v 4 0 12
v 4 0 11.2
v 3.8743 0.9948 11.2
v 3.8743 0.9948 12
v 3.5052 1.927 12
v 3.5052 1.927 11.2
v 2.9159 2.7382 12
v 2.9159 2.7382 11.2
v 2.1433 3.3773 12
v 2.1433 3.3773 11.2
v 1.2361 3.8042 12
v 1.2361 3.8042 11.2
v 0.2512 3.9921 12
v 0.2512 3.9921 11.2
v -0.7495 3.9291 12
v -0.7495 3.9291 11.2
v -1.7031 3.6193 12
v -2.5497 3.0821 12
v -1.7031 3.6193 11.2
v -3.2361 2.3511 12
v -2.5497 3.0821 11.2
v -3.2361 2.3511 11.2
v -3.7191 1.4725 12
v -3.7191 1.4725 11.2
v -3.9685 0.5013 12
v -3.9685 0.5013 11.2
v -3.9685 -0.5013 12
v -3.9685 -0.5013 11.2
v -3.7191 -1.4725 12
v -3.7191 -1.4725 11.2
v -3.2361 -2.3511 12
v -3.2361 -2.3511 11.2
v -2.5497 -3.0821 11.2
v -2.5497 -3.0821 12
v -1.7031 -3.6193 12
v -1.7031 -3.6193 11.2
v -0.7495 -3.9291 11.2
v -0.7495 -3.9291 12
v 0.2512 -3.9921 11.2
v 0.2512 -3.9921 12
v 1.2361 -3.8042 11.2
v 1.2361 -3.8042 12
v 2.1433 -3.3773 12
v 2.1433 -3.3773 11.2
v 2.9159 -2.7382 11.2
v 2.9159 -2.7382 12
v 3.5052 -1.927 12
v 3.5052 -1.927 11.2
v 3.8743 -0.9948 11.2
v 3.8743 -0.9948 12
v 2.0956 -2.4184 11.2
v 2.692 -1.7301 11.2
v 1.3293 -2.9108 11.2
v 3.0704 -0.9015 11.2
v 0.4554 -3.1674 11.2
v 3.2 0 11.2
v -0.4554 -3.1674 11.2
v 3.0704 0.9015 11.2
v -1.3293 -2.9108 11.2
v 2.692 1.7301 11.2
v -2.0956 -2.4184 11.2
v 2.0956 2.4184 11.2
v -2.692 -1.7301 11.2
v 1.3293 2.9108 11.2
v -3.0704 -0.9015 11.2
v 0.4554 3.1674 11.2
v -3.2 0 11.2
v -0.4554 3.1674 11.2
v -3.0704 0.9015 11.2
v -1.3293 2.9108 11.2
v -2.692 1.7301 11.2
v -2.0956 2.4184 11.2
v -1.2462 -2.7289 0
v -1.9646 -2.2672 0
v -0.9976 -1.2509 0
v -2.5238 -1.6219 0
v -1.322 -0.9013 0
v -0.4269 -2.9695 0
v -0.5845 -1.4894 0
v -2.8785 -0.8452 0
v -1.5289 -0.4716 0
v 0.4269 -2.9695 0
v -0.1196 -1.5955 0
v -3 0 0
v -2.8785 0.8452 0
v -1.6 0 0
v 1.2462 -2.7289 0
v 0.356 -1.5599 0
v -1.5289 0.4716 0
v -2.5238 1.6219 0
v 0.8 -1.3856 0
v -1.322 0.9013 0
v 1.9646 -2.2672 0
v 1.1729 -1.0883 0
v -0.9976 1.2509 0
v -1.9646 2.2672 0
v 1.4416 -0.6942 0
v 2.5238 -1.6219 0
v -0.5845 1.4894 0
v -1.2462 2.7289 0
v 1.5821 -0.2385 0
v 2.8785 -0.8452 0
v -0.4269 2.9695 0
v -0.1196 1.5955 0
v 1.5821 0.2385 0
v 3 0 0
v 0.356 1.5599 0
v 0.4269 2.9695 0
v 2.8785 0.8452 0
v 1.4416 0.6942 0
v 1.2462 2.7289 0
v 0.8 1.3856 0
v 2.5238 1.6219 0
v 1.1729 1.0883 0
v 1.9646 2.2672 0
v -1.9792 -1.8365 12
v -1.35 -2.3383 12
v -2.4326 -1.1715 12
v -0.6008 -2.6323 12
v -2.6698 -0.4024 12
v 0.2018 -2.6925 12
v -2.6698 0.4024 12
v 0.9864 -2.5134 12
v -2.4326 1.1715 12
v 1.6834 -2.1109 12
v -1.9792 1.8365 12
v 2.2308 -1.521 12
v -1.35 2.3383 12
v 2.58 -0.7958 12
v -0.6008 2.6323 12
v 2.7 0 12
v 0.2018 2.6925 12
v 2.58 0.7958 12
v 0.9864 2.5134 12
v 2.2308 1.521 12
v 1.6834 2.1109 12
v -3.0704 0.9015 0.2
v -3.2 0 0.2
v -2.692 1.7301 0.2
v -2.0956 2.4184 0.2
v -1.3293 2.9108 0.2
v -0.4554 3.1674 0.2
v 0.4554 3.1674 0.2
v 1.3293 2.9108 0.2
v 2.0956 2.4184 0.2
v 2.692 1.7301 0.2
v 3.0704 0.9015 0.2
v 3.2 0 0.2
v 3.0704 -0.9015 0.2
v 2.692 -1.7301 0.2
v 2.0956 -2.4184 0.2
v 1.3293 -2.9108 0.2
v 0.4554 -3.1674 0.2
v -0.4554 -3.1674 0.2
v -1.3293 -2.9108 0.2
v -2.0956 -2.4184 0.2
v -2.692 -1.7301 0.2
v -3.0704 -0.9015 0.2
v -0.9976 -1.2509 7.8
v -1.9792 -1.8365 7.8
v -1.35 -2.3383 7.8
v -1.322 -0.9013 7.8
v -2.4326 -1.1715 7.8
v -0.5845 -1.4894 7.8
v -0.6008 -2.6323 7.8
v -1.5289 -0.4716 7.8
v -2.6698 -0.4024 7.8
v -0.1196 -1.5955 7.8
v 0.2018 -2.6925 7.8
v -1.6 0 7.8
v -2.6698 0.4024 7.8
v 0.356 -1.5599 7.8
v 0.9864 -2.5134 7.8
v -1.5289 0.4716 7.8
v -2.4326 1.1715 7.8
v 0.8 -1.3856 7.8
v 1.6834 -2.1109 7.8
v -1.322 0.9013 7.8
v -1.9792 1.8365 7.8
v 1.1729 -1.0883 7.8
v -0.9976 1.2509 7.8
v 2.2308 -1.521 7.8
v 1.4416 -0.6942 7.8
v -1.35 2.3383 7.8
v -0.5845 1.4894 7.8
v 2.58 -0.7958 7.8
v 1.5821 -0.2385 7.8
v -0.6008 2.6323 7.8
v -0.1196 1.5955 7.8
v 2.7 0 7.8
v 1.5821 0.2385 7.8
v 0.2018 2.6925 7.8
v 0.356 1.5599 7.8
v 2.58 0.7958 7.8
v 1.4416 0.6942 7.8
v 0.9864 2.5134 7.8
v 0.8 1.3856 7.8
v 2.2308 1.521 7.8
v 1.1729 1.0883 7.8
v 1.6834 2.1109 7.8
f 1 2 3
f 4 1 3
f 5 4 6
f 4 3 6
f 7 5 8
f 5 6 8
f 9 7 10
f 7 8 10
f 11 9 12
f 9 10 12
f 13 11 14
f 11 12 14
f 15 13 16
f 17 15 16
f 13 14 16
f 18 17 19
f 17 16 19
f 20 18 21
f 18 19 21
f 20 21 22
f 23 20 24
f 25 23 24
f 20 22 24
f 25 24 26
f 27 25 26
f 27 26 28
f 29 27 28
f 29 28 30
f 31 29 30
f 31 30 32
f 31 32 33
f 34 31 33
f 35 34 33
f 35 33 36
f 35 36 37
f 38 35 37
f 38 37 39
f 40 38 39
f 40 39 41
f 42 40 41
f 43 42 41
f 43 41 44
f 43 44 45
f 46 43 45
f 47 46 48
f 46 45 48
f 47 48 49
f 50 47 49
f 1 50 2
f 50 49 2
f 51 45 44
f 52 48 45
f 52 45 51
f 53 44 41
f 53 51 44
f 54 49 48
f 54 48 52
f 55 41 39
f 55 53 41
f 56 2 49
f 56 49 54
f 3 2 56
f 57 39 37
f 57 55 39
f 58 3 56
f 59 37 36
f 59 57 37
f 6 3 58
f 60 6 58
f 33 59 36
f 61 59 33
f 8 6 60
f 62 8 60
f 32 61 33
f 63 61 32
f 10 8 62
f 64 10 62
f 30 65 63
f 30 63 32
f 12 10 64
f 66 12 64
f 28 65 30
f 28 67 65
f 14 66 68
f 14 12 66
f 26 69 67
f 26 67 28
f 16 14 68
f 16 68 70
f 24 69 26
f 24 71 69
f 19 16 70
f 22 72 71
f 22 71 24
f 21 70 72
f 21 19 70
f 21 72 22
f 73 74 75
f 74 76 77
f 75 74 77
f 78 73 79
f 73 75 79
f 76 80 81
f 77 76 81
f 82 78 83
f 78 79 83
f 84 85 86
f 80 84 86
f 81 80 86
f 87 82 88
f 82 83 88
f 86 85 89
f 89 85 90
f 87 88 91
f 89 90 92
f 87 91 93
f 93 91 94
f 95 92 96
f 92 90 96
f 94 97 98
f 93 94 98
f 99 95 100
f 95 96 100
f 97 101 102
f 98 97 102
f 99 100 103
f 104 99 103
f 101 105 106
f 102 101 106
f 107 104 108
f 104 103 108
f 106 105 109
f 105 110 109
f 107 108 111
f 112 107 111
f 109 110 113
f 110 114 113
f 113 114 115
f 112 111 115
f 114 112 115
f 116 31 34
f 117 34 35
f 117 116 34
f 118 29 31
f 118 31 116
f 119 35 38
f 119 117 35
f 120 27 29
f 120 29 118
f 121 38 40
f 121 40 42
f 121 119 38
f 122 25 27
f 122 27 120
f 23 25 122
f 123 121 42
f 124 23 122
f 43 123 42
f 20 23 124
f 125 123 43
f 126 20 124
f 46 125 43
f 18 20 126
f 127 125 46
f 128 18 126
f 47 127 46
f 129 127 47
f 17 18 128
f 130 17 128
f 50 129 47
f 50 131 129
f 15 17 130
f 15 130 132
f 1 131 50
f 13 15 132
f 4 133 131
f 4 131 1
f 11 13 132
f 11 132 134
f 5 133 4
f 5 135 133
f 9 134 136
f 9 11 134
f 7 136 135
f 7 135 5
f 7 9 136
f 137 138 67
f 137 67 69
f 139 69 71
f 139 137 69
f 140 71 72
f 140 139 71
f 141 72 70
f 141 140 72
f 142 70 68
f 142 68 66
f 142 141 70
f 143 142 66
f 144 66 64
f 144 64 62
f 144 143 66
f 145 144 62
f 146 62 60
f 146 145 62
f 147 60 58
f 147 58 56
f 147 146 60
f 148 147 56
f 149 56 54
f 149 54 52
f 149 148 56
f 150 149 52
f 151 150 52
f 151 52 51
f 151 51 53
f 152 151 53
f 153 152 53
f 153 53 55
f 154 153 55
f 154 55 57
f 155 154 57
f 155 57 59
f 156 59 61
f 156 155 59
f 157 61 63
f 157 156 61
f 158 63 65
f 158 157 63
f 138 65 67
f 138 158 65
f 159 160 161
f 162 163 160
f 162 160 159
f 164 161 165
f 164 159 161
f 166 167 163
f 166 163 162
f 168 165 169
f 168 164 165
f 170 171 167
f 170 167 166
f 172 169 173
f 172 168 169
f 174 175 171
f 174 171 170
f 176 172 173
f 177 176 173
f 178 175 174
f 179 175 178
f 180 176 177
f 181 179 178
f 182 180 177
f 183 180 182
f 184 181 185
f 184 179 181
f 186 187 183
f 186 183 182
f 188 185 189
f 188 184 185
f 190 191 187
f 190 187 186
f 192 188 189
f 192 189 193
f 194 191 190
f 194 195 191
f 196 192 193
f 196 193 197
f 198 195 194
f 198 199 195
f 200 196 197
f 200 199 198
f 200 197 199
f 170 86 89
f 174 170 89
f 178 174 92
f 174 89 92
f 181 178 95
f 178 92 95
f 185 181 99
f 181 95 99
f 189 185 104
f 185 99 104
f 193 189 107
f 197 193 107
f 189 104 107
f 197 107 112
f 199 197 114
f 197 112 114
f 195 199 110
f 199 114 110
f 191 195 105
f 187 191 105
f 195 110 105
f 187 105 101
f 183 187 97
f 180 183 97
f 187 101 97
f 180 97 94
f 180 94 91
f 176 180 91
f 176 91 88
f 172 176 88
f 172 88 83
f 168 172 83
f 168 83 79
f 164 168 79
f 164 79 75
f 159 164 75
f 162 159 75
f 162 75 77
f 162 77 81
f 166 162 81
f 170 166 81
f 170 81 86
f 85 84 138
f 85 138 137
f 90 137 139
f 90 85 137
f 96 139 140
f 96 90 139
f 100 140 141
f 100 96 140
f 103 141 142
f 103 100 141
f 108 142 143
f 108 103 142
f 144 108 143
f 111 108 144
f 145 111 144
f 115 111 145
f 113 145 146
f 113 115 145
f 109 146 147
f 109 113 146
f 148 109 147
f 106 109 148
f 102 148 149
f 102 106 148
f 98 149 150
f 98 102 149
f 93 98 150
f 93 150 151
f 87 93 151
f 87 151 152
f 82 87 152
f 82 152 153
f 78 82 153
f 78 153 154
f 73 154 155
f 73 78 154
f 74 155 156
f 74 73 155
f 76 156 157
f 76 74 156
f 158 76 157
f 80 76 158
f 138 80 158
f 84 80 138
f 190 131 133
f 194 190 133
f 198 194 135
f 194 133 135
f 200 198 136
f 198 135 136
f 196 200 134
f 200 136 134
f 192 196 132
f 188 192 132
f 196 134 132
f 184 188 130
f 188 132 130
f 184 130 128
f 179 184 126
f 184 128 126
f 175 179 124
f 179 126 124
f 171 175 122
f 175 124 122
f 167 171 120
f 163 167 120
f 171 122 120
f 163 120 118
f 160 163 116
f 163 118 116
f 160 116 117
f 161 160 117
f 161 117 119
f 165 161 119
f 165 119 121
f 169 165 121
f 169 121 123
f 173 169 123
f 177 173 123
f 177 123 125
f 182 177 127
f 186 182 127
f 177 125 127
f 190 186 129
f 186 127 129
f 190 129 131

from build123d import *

# Parameters (mm, degrees)
SKETCH_1_R          = 4
EXTRUDE_1_DEPTH     = 12
SKETCH_2_R          = 2.7
CUT_EXTRUDE_1_DEPTH = 4.2
SKETCH_3_OUTSIDE_W  = 13.298
SKETCH_3_OUTSIDE_H  = 13.298
SKETCH_3_OUTSIDE_R  = 3.2
CUT_EXTRUDE_2_DEPTH = 11.2
SKETCH_4_R          = 1.6
CUT_EXTRUDE_3_DEPTH = 11.2
CHAMFER_1_SIZE      = 0.2


with BuildPart() as part:
    # Эскиз1 → Бобышка-Вытянуть1 (new body)
    with BuildSketch(Plane.XY):
        Circle(SKETCH_1_R)
    extrude(amount=EXTRUDE_1_DEPTH)

    # Эскиз2 → Вырез-Вытянуть1 (cut)
    with BuildSketch(Plane.XY.offset(12)):
        Circle(SKETCH_2_R)
    extrude(amount=-CUT_EXTRUDE_1_DEPTH, mode=Mode.SUBTRACT)

    # Эскиз3 outside → Вырез-Вытянуть2 (cut)
    with BuildSketch(Plane(origin=(0, 0, 0), x_dir=(-1, 0, 0), z_dir=(0, 0, -1))):
        Rectangle(SKETCH_3_OUTSIDE_W, SKETCH_3_OUTSIDE_H)
        Circle(SKETCH_3_OUTSIDE_R, mode=Mode.SUBTRACT)
    extrude(amount=-CUT_EXTRUDE_2_DEPTH, mode=Mode.SUBTRACT)

    # Эскиз4 → Вырез-Вытянуть3 (cut)
    with BuildSketch(Plane(origin=(0, 0, 0), x_dir=(-1, 0, 0), z_dir=(0, 0, -1))):
        Circle(SKETCH_4_R)
    extrude(amount=-CUT_EXTRUDE_3_DEPTH, mode=Mode.SUBTRACT)

    # Фаска1
    chamfer_1_edges = [part.edges().sort_by_distance(p)[0] for p in [
        (3.2, 0, 0),
    ]]
    chamfer(chamfer_1_edges, length=CHAMFER_1_SIZE)


solid = part.part
